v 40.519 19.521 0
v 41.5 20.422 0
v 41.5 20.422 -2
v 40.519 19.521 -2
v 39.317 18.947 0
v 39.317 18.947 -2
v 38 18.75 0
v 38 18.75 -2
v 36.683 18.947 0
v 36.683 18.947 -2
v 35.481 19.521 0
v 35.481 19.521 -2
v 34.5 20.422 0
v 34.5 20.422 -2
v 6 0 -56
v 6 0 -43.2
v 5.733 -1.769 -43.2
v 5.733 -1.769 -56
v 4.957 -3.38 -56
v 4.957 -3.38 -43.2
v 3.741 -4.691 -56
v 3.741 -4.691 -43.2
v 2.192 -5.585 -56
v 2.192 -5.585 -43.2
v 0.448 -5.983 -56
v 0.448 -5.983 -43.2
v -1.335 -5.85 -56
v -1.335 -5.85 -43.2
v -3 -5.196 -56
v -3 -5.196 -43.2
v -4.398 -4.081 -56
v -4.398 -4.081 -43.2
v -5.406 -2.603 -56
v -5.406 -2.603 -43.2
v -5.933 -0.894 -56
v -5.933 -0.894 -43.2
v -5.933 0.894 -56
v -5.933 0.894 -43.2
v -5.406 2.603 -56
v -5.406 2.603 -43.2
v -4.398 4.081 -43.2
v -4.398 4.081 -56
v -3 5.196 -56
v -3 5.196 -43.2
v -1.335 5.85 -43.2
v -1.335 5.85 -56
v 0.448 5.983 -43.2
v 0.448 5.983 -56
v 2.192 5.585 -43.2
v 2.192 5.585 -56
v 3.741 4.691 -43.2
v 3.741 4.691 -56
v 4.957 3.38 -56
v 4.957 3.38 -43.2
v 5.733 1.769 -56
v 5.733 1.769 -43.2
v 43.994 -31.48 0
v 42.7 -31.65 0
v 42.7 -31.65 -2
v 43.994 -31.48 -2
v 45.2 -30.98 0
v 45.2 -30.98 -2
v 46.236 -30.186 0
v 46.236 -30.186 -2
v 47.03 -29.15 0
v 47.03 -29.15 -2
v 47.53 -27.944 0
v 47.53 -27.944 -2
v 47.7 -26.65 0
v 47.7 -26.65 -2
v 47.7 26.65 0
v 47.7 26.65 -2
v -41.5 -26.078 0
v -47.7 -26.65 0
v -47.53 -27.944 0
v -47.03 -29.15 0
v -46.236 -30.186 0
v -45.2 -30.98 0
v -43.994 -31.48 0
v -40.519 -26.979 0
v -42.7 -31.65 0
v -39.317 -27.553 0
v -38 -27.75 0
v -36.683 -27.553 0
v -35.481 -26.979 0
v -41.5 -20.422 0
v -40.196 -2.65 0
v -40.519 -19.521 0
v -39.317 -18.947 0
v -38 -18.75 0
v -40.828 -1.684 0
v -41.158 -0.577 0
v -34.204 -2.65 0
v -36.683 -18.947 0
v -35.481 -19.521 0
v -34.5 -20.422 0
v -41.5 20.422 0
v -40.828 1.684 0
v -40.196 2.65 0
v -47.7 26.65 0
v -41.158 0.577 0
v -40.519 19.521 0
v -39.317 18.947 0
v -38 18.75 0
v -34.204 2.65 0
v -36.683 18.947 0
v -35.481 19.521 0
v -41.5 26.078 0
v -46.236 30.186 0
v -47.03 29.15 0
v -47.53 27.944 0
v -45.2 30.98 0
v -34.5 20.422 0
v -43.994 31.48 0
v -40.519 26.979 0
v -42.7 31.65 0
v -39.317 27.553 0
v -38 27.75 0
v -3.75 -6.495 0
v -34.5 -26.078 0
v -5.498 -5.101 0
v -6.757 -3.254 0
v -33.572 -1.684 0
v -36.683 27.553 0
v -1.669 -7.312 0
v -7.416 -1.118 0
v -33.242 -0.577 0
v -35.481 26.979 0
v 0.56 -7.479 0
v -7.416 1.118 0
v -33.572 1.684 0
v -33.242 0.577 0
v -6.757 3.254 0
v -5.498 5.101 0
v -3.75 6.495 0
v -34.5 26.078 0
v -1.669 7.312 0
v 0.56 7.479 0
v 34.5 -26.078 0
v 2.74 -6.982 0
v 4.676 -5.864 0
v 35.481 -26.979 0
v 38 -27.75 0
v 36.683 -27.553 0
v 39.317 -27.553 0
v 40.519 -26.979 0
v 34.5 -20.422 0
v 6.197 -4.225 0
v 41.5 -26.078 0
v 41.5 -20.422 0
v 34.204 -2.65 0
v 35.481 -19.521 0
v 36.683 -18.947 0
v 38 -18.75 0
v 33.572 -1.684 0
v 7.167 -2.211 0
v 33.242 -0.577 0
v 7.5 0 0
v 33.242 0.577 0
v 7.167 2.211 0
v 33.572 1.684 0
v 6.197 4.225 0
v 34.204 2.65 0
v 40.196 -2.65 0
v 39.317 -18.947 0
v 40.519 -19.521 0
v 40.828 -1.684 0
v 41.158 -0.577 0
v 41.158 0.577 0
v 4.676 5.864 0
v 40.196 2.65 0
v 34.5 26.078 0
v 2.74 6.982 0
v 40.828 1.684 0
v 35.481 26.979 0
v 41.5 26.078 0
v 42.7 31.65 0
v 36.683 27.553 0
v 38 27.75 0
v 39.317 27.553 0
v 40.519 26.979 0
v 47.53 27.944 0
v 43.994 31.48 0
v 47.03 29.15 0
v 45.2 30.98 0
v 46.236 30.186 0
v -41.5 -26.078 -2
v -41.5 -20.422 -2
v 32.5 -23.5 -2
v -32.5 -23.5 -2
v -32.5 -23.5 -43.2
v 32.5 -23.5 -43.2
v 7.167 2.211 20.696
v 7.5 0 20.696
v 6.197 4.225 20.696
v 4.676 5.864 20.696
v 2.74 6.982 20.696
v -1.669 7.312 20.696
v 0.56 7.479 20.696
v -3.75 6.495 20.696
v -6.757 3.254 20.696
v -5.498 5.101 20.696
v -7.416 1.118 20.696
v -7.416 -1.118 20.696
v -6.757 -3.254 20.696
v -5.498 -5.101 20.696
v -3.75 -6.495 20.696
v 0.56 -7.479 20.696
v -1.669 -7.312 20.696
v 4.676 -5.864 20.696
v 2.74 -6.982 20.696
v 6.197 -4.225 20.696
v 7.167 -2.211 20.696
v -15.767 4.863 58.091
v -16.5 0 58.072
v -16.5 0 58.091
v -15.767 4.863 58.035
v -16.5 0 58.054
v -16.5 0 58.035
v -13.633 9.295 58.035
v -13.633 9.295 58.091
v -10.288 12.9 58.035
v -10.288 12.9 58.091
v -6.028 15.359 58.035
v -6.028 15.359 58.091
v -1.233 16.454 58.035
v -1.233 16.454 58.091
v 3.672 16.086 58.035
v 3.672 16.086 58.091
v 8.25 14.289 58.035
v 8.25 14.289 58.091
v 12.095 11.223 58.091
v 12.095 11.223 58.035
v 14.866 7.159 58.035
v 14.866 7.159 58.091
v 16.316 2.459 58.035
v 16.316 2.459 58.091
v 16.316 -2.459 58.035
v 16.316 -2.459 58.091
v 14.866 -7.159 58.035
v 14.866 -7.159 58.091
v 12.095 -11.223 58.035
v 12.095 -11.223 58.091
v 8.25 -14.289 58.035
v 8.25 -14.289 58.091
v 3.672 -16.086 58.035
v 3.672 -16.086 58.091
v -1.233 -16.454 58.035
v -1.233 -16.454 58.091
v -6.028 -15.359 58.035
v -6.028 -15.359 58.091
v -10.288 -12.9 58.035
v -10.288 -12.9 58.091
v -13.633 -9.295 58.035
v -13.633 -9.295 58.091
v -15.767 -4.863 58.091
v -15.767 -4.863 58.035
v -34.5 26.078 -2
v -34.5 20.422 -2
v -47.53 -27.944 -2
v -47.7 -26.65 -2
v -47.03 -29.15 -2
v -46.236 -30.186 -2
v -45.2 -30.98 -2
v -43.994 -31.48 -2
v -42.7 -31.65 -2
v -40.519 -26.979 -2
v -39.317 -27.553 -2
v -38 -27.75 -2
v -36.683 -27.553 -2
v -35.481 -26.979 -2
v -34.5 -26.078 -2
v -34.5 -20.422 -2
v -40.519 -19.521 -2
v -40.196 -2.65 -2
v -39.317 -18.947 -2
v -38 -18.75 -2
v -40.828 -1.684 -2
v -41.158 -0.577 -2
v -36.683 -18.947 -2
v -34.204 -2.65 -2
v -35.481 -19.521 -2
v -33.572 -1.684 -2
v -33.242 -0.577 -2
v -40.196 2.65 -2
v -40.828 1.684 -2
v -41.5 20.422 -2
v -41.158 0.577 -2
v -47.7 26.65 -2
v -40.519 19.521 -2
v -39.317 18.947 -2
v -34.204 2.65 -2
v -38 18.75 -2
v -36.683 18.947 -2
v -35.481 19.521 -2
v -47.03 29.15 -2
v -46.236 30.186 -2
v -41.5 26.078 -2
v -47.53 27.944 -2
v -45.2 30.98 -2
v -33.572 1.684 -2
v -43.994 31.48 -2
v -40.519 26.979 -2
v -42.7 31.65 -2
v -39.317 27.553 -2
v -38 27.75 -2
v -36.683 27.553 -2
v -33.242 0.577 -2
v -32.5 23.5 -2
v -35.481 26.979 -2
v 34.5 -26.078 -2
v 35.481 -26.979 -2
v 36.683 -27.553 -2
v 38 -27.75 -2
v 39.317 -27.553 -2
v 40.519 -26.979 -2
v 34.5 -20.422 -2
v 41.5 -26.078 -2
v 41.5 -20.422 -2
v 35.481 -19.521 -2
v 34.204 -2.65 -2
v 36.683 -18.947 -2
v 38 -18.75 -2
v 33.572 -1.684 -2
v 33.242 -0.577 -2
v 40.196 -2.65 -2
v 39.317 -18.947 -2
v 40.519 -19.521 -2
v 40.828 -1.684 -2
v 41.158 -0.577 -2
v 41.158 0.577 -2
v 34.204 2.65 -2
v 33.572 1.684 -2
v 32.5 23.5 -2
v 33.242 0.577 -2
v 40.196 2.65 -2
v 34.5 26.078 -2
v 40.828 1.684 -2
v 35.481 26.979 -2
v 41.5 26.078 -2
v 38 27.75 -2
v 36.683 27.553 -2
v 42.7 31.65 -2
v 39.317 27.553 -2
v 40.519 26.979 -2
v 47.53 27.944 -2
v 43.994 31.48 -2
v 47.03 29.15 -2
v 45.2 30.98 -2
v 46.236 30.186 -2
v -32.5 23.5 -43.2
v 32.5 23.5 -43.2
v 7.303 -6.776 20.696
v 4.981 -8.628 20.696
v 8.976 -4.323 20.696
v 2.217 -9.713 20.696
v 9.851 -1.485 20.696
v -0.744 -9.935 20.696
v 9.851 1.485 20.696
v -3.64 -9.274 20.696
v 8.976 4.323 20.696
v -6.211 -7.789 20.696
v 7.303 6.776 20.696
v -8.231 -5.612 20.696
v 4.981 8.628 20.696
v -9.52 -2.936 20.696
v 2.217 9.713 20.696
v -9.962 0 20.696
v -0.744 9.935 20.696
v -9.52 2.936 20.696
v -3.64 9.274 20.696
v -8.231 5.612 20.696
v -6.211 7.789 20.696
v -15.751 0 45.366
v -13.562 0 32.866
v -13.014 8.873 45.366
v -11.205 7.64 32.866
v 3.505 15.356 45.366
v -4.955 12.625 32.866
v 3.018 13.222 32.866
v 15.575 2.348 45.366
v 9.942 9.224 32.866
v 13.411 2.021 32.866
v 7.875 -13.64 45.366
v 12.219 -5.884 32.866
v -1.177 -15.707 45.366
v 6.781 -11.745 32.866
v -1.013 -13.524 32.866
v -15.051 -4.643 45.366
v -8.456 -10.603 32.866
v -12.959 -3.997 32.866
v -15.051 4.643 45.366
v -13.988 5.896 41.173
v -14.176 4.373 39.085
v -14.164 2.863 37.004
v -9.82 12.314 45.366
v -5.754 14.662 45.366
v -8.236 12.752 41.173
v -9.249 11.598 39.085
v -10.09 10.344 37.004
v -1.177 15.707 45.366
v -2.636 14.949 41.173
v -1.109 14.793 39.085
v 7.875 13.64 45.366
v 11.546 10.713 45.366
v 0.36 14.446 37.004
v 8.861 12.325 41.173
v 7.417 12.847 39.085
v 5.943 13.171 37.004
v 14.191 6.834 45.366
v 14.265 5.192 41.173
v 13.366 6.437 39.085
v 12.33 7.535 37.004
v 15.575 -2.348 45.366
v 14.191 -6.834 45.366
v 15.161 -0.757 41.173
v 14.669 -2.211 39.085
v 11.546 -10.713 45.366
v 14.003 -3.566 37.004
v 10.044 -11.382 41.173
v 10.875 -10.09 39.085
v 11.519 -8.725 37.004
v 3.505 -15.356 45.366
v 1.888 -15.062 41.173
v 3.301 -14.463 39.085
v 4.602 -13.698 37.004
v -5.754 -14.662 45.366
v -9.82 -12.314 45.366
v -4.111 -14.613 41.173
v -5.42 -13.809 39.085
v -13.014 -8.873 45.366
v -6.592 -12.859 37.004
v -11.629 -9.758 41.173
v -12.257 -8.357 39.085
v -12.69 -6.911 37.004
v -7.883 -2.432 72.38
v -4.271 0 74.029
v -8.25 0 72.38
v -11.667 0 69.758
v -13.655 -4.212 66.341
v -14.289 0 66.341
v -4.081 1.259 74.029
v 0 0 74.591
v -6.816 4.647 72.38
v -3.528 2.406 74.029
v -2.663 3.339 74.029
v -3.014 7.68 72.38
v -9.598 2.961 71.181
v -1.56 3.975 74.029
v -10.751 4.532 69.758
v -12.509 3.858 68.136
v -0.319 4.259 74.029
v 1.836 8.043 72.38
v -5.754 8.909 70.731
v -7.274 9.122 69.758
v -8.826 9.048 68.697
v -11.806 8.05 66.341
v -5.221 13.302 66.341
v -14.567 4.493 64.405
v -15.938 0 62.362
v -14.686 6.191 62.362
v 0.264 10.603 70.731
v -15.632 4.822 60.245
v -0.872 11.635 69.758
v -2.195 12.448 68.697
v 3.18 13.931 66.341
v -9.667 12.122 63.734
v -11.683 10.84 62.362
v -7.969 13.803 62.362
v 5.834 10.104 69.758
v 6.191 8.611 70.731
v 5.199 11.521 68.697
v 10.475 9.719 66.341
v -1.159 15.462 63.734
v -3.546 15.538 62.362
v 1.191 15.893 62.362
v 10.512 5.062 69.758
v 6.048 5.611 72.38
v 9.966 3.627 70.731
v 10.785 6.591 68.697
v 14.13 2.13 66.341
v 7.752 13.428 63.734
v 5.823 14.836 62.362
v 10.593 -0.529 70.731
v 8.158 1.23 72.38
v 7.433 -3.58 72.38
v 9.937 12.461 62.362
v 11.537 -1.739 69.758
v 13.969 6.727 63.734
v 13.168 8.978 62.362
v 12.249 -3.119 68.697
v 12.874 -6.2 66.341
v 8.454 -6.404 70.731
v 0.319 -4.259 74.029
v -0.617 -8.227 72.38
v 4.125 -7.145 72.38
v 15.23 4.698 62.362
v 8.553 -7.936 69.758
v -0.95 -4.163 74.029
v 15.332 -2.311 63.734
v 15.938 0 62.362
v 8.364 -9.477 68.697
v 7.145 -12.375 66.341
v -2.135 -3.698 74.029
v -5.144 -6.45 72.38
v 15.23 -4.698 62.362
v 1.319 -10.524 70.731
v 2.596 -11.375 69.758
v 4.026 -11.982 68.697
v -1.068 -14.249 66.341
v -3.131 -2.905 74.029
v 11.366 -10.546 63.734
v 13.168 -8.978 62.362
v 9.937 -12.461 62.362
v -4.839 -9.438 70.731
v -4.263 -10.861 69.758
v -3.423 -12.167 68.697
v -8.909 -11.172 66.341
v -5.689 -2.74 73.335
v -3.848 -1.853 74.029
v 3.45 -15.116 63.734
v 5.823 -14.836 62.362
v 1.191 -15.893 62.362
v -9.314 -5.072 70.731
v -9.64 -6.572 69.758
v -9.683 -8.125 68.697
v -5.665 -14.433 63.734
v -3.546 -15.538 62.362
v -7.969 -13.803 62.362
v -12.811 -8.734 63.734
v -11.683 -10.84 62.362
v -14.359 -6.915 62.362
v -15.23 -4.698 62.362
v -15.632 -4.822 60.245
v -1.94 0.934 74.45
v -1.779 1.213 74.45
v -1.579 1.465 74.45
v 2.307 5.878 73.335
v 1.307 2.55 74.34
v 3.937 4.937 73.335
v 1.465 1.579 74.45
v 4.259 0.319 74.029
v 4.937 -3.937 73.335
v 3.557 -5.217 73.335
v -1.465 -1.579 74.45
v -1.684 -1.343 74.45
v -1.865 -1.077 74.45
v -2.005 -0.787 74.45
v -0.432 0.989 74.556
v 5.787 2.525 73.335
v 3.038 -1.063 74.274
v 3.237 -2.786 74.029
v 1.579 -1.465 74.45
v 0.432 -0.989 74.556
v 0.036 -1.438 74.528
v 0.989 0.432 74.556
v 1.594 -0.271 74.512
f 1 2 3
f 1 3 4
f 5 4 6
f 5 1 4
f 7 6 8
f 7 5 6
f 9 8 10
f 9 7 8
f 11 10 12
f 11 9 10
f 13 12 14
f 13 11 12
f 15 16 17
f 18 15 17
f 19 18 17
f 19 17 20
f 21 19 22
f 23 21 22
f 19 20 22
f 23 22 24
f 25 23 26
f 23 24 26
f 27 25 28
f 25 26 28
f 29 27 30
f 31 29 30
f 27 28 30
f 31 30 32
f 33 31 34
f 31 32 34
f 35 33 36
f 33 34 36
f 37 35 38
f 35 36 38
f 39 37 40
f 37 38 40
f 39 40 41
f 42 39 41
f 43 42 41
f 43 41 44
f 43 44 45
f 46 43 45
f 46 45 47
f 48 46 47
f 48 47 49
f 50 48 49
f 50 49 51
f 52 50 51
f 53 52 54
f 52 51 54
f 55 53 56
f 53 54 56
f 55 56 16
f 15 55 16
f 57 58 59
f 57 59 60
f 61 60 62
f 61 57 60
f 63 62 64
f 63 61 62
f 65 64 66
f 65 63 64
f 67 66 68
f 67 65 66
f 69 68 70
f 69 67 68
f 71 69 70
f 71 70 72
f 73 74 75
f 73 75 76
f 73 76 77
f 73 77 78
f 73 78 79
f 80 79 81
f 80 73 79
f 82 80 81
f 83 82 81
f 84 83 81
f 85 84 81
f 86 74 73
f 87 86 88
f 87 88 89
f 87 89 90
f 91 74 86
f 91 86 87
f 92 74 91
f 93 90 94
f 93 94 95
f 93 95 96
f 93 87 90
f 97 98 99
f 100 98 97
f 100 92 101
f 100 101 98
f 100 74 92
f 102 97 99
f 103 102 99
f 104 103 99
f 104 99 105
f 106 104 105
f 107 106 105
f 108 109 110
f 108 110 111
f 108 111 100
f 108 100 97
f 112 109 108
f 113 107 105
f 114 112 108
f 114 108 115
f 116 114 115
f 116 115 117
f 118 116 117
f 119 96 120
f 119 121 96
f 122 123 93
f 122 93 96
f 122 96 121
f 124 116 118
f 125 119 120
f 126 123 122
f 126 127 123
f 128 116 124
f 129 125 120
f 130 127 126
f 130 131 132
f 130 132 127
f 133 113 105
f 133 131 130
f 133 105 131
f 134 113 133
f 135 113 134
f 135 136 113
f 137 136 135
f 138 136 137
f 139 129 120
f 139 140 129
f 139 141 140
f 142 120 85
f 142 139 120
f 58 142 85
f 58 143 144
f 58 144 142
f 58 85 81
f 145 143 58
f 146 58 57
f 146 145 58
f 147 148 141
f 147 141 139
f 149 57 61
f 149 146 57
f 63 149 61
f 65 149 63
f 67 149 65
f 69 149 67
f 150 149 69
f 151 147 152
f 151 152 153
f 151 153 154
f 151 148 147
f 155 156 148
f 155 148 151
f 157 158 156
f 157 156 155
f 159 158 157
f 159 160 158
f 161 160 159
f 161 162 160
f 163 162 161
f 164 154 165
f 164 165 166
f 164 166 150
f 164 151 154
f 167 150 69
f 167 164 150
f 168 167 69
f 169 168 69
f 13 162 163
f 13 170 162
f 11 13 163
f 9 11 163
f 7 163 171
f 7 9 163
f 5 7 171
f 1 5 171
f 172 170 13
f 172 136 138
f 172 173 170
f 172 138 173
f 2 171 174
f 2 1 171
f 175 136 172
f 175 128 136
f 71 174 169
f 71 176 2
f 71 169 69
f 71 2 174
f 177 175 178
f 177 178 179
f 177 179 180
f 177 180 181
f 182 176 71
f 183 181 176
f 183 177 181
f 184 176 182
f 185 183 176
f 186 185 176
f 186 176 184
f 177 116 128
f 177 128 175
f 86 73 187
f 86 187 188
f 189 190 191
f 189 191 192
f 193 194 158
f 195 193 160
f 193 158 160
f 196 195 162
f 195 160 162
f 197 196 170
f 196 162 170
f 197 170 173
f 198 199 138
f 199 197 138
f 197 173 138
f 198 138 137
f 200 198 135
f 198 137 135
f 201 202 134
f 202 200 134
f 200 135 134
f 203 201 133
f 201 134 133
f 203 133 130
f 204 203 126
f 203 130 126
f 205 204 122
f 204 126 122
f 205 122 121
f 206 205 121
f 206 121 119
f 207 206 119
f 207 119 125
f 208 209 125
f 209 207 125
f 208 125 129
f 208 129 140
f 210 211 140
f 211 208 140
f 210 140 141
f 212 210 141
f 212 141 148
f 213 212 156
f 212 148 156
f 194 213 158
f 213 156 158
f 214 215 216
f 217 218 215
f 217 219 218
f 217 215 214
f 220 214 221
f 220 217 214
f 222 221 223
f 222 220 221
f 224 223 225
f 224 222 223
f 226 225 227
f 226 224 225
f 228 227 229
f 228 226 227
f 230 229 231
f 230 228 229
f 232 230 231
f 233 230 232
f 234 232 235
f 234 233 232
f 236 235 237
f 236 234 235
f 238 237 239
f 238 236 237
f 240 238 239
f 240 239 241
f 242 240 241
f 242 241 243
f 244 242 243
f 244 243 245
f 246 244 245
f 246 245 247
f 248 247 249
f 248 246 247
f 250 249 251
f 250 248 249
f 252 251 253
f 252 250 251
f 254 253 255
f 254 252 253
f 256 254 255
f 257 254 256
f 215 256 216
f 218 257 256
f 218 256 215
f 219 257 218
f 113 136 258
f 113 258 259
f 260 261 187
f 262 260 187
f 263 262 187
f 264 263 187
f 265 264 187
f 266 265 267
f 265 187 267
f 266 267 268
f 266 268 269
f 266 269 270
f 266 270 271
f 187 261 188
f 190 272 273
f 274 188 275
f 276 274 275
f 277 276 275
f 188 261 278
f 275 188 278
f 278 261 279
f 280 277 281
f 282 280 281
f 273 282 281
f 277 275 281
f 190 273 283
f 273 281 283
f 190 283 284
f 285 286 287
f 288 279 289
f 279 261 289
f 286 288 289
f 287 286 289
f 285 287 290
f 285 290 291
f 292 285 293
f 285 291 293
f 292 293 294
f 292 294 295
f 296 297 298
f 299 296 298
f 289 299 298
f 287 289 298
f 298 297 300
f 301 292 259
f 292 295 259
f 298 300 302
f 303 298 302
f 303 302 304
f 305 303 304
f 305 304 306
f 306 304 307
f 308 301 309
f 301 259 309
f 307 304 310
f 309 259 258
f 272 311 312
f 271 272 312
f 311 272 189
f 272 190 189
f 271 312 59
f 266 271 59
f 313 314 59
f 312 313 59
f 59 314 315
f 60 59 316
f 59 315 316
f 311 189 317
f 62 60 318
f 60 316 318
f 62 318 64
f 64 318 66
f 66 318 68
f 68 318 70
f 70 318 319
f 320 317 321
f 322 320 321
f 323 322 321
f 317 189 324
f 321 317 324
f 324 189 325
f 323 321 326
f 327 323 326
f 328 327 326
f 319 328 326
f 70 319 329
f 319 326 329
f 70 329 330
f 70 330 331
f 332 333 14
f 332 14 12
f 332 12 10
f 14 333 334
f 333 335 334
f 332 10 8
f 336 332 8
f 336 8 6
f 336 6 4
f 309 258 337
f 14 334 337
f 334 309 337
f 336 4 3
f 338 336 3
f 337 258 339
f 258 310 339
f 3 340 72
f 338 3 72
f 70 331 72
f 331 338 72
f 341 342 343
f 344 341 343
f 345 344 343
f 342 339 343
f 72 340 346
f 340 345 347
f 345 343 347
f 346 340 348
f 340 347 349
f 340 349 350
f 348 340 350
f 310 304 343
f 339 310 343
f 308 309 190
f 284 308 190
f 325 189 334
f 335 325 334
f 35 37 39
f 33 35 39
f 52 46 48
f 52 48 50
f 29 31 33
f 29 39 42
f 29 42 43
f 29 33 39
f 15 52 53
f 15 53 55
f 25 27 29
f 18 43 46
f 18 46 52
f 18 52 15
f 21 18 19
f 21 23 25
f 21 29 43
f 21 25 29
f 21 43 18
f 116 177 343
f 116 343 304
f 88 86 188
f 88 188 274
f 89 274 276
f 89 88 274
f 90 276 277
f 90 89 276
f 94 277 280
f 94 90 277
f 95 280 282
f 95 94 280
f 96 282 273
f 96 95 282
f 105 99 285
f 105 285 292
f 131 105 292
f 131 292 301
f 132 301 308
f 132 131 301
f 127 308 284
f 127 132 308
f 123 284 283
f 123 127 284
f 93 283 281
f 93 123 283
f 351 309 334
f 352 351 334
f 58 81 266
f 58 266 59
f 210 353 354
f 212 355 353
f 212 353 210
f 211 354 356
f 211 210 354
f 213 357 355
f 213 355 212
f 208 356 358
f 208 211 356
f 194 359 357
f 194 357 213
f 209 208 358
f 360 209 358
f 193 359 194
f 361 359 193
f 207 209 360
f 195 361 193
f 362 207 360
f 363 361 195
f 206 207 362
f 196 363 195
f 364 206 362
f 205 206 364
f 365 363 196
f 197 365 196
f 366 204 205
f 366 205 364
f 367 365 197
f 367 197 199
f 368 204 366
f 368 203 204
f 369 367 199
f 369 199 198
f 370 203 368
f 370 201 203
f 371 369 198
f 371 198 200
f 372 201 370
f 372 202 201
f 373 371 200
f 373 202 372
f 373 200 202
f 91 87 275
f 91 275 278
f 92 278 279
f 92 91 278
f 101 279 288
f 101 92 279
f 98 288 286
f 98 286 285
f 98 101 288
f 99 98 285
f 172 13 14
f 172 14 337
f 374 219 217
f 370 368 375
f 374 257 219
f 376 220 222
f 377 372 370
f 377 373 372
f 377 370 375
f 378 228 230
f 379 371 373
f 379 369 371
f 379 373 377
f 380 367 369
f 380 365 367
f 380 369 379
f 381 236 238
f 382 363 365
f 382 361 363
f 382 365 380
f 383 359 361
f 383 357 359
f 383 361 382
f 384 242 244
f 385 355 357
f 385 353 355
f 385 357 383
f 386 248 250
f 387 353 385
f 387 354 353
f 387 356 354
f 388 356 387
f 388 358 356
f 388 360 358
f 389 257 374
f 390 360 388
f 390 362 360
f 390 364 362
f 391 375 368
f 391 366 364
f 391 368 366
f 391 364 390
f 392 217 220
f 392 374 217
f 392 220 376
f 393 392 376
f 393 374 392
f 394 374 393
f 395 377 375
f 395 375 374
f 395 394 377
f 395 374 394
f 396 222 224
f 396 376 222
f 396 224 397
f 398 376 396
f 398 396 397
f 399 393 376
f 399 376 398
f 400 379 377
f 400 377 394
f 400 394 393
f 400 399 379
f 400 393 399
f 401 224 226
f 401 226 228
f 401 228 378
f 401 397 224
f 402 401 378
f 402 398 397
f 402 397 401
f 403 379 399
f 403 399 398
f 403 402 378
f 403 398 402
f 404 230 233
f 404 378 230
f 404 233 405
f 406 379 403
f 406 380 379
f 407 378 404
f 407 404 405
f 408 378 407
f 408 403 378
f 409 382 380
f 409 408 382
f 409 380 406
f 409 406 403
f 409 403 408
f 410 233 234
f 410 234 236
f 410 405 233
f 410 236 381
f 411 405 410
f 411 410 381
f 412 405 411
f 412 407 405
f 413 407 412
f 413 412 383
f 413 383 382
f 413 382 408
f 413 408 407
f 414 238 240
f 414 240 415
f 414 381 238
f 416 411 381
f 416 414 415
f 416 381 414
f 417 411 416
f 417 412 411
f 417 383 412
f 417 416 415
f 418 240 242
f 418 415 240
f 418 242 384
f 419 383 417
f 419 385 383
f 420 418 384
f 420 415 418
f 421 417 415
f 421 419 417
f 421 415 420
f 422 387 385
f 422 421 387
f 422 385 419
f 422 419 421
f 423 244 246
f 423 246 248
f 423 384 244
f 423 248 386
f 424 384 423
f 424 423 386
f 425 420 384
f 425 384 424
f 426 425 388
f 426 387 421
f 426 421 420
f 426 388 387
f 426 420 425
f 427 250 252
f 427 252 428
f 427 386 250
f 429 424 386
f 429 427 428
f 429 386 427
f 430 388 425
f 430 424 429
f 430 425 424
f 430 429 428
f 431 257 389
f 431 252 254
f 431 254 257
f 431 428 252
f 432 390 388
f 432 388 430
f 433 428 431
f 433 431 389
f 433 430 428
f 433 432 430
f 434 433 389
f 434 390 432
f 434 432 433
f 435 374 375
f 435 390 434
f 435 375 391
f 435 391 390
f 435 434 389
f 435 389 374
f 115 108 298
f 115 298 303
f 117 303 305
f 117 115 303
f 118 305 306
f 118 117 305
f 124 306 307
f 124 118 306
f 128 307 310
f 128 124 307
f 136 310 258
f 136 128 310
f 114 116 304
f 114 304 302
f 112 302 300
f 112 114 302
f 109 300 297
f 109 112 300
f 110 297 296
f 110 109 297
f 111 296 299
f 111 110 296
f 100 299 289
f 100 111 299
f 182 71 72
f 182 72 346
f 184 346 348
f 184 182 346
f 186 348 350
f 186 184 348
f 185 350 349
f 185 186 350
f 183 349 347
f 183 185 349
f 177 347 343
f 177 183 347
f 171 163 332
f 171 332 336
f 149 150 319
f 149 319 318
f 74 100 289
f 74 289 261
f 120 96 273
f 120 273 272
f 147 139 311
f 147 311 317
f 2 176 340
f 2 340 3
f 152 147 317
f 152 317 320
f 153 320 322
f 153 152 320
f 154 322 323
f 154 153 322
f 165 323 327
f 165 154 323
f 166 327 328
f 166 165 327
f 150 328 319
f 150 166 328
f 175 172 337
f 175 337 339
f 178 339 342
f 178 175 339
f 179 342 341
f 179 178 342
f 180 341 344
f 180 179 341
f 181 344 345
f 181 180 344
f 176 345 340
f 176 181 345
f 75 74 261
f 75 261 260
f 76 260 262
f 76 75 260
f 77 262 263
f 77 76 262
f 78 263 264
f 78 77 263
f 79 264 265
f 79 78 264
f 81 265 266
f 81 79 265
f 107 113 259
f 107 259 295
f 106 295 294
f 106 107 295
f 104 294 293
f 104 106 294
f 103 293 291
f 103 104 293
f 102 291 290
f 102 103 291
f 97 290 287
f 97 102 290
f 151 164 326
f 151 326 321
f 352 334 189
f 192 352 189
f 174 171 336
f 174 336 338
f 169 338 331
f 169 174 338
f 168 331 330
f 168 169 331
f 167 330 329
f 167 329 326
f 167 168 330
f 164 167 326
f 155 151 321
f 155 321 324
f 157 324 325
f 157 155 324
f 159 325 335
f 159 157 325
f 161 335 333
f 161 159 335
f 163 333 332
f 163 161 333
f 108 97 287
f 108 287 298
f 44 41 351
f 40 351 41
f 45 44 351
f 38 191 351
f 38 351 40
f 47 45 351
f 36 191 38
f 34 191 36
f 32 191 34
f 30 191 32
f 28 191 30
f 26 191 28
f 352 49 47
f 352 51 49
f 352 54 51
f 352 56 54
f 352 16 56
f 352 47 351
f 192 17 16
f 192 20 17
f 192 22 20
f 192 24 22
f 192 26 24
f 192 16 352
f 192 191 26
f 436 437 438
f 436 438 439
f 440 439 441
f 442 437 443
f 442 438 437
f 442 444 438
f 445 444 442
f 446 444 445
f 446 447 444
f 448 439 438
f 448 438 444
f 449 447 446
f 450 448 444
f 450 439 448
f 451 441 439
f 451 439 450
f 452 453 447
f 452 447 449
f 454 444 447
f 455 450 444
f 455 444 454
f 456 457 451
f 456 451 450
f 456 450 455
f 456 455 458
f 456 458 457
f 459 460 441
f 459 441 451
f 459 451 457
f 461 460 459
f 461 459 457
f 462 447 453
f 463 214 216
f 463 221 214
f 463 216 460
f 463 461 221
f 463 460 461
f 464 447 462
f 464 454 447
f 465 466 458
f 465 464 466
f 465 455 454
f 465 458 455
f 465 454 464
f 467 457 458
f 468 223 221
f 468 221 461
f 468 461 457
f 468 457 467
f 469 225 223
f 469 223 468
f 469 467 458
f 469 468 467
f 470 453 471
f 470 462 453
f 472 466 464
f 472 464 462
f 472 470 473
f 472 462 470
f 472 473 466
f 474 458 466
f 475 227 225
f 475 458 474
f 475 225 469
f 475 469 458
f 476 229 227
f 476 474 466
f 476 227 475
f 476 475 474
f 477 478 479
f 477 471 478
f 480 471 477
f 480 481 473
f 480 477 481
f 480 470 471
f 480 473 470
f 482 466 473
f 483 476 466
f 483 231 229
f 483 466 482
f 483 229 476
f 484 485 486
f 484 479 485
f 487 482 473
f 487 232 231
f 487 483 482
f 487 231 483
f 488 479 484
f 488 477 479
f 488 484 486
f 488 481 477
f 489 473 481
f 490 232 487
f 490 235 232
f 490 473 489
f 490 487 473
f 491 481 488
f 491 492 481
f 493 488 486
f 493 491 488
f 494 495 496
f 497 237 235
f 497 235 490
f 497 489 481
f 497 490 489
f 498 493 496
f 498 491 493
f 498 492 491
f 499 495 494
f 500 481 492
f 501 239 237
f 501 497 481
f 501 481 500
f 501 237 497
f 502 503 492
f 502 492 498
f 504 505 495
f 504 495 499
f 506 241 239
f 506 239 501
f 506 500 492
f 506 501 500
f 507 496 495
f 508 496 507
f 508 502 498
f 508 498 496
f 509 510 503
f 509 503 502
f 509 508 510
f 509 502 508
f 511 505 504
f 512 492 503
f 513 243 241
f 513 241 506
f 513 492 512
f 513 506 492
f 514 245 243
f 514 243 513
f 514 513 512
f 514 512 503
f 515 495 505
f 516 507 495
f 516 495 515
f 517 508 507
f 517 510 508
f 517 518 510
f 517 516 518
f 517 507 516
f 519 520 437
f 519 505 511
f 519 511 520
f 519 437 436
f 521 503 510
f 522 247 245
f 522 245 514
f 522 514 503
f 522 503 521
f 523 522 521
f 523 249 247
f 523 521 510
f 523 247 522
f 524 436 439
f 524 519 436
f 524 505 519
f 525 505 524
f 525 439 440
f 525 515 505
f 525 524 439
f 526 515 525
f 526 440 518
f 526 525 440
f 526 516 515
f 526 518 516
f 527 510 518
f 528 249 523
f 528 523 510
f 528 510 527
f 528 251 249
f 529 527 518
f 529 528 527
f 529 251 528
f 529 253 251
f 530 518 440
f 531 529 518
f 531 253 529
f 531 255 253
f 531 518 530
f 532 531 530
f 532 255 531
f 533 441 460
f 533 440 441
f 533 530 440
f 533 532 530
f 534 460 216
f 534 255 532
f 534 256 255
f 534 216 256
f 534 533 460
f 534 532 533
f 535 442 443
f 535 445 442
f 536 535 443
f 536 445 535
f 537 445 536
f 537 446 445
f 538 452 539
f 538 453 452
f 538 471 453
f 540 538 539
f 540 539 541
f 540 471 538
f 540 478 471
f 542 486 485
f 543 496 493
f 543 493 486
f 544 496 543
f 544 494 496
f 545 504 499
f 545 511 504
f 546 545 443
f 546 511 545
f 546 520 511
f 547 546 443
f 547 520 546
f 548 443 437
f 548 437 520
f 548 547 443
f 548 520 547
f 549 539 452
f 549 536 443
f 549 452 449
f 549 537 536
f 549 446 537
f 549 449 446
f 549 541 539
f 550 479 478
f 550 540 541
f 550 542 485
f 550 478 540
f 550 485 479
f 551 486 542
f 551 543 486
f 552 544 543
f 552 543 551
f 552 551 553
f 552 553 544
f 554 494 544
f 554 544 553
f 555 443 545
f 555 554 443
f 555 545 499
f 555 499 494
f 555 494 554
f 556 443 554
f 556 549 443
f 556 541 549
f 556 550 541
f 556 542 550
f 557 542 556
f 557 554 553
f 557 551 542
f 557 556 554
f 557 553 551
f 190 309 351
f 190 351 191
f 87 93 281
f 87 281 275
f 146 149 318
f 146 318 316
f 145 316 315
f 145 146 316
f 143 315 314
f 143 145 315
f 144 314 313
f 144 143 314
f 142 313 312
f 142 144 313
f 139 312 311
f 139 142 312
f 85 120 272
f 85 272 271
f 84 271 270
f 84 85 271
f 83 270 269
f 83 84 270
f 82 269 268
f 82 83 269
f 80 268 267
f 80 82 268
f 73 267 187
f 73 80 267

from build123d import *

# Parameters (mm, degrees)
F1_DEPTH = 2
F2_R     = 7.5
F3_DEPTH = 70
F6_W     = 65
F6_H     = 47
F7_DEPTH = 41.2
F8_R     = 6
F9_DEPTH = 12.8


with BuildPart() as f1:
    # F0 (on Top) → F1 (new body)
    with BuildSketch(Plane.XY):
        with BuildLine():
            Line((-42.7, -31.65), (42.7, -31.65))
            ThreePointArc((42.7, -31.65), (46.235534, -30.185534), (47.7, -26.65))
            Line((47.7, -26.65), (47.7, 26.65))
            ThreePointArc((47.7, 26.65), (46.235534, 30.185534), (42.7, 31.65))
            Line((42.7, 31.65), (-42.7, 31.65))
            ThreePointArc((-42.7, 31.65), (-46.235534, 30.185534), (-47.7, 26.65))
            Line((-47.7, 26.65), (-47.7, -26.65))
            ThreePointArc((-47.7, -26.65), (-46.235534, -30.185534), (-42.7, -31.65))
        make_face()
        with BuildLine():
            Line((-41.5, -26.078427), (-41.5, -20.421573))
            ThreePointArc((-41.5, -20.421573), (-38, -18.75), (-34.5, -20.421573))
            Line((-34.5, -20.421573), (-34.5, -26.078427))
            ThreePointArc((-34.5, -26.078427), (-38, -27.75), (-41.5, -26.078427))
        make_face(mode=Mode.SUBTRACT)
        with BuildLine():
            ThreePointArc((34.5, -20.421573), (38, -18.75), (41.5, -20.421573))
            Line((41.5, -20.421573), (41.5, -26.078427))
            ThreePointArc((41.5, -26.078427), (38, -27.75), (34.5, -26.078427))
            Line((34.5, -26.078427), (34.5, -20.421573))
        make_face(mode=Mode.SUBTRACT)
        with BuildLine():
            ThreePointArc((-34.203752, 2.65), (-33.2, 0), (-34.203752, -2.65))
            Line((-34.203752, -2.65), (-40.196248, -2.65))
            ThreePointArc((-40.196248, -2.65), (-41.2, 0), (-40.196248, 2.65))
            Line((-40.196248, 2.65), (-34.203752, 2.65))
        make_face(mode=Mode.SUBTRACT)
        with BuildLine():
            ThreePointArc((-41.5, 26.078427), (-38, 27.75), (-34.5, 26.078427))
            Line((-34.5, 26.078427), (-34.5, 20.421573))
            ThreePointArc((-34.5, 20.421573), (-38, 18.75), (-41.5, 20.421573))
            Line((-41.5, 20.421573), (-41.5, 26.078427))
        make_face(mode=Mode.SUBTRACT)
        with BuildLine():
            ThreePointArc((34.203752, -2.65), (33.2, 0), (34.203752, 2.65))
            Line((34.203752, 2.65), (40.196248, 2.65))
            ThreePointArc((40.196248, 2.65), (41.2, 0), (40.196248, -2.65))
            Line((40.196248, -2.65), (34.203752, -2.65))
        make_face(mode=Mode.SUBTRACT)
        with BuildLine():
            Line((41.5, 26.078427), (41.5, 20.421573))
            ThreePointArc((41.5, 20.421573), (38, 18.75), (34.5, 20.421573))
            Line((34.5, 20.421573), (34.5, 26.078427))
            ThreePointArc((34.5, 26.078427), (38, 27.75), (41.5, 26.078427))
        make_face(mode=Mode.SUBTRACT)
    extrude(amount=-F1_DEPTH)

    # F2 (on face) → F3 (join)
    with BuildSketch(Plane.XY):
        Circle(F2_R)
    extrude(amount=F3_DEPTH)

    # F4 (on Front) → F5 (revolve)
    with BuildSketch(Plane.XZ):
        with BuildLine():
            ThreePointArc((0, 74.590989), (-11.667262, 69.758251), (-16.5, 58.090989))
            ThreePointArc((-16.5, 58.090989), (-16.499956, 58.063064), (-16.499905, 58.03514))
            ThreePointArc((-16.499905, 58.03514), (-14.834915, 39.084766), (-9.962409, 20.695977))
            Line((-9.962409, 20.695977), (0, 20.695977))
            Line((0, 20.695977), (0, 74.590989))
        make_face()
    revolve(axis=Axis((0, 0, 47.643483), (0, 0, -1)))

    # F6 (on face) → F7 (join)
    with BuildSketch(Plane(origin=(0, 0, -2), x_dir=(1, 0, 0), z_dir=(0, 0, -1))):
        Rectangle(F6_W, F6_H)
    extrude(amount=F7_DEPTH)

    # F8 (on face) → F9 (join)
    with BuildSketch(Plane(origin=(0, 0, -43.2), x_dir=(1, 0, 0), z_dir=(0, 0, -1))):
        Circle(F8_R)
    extrude(amount=F9_DEPTH)


solid = f1.part
